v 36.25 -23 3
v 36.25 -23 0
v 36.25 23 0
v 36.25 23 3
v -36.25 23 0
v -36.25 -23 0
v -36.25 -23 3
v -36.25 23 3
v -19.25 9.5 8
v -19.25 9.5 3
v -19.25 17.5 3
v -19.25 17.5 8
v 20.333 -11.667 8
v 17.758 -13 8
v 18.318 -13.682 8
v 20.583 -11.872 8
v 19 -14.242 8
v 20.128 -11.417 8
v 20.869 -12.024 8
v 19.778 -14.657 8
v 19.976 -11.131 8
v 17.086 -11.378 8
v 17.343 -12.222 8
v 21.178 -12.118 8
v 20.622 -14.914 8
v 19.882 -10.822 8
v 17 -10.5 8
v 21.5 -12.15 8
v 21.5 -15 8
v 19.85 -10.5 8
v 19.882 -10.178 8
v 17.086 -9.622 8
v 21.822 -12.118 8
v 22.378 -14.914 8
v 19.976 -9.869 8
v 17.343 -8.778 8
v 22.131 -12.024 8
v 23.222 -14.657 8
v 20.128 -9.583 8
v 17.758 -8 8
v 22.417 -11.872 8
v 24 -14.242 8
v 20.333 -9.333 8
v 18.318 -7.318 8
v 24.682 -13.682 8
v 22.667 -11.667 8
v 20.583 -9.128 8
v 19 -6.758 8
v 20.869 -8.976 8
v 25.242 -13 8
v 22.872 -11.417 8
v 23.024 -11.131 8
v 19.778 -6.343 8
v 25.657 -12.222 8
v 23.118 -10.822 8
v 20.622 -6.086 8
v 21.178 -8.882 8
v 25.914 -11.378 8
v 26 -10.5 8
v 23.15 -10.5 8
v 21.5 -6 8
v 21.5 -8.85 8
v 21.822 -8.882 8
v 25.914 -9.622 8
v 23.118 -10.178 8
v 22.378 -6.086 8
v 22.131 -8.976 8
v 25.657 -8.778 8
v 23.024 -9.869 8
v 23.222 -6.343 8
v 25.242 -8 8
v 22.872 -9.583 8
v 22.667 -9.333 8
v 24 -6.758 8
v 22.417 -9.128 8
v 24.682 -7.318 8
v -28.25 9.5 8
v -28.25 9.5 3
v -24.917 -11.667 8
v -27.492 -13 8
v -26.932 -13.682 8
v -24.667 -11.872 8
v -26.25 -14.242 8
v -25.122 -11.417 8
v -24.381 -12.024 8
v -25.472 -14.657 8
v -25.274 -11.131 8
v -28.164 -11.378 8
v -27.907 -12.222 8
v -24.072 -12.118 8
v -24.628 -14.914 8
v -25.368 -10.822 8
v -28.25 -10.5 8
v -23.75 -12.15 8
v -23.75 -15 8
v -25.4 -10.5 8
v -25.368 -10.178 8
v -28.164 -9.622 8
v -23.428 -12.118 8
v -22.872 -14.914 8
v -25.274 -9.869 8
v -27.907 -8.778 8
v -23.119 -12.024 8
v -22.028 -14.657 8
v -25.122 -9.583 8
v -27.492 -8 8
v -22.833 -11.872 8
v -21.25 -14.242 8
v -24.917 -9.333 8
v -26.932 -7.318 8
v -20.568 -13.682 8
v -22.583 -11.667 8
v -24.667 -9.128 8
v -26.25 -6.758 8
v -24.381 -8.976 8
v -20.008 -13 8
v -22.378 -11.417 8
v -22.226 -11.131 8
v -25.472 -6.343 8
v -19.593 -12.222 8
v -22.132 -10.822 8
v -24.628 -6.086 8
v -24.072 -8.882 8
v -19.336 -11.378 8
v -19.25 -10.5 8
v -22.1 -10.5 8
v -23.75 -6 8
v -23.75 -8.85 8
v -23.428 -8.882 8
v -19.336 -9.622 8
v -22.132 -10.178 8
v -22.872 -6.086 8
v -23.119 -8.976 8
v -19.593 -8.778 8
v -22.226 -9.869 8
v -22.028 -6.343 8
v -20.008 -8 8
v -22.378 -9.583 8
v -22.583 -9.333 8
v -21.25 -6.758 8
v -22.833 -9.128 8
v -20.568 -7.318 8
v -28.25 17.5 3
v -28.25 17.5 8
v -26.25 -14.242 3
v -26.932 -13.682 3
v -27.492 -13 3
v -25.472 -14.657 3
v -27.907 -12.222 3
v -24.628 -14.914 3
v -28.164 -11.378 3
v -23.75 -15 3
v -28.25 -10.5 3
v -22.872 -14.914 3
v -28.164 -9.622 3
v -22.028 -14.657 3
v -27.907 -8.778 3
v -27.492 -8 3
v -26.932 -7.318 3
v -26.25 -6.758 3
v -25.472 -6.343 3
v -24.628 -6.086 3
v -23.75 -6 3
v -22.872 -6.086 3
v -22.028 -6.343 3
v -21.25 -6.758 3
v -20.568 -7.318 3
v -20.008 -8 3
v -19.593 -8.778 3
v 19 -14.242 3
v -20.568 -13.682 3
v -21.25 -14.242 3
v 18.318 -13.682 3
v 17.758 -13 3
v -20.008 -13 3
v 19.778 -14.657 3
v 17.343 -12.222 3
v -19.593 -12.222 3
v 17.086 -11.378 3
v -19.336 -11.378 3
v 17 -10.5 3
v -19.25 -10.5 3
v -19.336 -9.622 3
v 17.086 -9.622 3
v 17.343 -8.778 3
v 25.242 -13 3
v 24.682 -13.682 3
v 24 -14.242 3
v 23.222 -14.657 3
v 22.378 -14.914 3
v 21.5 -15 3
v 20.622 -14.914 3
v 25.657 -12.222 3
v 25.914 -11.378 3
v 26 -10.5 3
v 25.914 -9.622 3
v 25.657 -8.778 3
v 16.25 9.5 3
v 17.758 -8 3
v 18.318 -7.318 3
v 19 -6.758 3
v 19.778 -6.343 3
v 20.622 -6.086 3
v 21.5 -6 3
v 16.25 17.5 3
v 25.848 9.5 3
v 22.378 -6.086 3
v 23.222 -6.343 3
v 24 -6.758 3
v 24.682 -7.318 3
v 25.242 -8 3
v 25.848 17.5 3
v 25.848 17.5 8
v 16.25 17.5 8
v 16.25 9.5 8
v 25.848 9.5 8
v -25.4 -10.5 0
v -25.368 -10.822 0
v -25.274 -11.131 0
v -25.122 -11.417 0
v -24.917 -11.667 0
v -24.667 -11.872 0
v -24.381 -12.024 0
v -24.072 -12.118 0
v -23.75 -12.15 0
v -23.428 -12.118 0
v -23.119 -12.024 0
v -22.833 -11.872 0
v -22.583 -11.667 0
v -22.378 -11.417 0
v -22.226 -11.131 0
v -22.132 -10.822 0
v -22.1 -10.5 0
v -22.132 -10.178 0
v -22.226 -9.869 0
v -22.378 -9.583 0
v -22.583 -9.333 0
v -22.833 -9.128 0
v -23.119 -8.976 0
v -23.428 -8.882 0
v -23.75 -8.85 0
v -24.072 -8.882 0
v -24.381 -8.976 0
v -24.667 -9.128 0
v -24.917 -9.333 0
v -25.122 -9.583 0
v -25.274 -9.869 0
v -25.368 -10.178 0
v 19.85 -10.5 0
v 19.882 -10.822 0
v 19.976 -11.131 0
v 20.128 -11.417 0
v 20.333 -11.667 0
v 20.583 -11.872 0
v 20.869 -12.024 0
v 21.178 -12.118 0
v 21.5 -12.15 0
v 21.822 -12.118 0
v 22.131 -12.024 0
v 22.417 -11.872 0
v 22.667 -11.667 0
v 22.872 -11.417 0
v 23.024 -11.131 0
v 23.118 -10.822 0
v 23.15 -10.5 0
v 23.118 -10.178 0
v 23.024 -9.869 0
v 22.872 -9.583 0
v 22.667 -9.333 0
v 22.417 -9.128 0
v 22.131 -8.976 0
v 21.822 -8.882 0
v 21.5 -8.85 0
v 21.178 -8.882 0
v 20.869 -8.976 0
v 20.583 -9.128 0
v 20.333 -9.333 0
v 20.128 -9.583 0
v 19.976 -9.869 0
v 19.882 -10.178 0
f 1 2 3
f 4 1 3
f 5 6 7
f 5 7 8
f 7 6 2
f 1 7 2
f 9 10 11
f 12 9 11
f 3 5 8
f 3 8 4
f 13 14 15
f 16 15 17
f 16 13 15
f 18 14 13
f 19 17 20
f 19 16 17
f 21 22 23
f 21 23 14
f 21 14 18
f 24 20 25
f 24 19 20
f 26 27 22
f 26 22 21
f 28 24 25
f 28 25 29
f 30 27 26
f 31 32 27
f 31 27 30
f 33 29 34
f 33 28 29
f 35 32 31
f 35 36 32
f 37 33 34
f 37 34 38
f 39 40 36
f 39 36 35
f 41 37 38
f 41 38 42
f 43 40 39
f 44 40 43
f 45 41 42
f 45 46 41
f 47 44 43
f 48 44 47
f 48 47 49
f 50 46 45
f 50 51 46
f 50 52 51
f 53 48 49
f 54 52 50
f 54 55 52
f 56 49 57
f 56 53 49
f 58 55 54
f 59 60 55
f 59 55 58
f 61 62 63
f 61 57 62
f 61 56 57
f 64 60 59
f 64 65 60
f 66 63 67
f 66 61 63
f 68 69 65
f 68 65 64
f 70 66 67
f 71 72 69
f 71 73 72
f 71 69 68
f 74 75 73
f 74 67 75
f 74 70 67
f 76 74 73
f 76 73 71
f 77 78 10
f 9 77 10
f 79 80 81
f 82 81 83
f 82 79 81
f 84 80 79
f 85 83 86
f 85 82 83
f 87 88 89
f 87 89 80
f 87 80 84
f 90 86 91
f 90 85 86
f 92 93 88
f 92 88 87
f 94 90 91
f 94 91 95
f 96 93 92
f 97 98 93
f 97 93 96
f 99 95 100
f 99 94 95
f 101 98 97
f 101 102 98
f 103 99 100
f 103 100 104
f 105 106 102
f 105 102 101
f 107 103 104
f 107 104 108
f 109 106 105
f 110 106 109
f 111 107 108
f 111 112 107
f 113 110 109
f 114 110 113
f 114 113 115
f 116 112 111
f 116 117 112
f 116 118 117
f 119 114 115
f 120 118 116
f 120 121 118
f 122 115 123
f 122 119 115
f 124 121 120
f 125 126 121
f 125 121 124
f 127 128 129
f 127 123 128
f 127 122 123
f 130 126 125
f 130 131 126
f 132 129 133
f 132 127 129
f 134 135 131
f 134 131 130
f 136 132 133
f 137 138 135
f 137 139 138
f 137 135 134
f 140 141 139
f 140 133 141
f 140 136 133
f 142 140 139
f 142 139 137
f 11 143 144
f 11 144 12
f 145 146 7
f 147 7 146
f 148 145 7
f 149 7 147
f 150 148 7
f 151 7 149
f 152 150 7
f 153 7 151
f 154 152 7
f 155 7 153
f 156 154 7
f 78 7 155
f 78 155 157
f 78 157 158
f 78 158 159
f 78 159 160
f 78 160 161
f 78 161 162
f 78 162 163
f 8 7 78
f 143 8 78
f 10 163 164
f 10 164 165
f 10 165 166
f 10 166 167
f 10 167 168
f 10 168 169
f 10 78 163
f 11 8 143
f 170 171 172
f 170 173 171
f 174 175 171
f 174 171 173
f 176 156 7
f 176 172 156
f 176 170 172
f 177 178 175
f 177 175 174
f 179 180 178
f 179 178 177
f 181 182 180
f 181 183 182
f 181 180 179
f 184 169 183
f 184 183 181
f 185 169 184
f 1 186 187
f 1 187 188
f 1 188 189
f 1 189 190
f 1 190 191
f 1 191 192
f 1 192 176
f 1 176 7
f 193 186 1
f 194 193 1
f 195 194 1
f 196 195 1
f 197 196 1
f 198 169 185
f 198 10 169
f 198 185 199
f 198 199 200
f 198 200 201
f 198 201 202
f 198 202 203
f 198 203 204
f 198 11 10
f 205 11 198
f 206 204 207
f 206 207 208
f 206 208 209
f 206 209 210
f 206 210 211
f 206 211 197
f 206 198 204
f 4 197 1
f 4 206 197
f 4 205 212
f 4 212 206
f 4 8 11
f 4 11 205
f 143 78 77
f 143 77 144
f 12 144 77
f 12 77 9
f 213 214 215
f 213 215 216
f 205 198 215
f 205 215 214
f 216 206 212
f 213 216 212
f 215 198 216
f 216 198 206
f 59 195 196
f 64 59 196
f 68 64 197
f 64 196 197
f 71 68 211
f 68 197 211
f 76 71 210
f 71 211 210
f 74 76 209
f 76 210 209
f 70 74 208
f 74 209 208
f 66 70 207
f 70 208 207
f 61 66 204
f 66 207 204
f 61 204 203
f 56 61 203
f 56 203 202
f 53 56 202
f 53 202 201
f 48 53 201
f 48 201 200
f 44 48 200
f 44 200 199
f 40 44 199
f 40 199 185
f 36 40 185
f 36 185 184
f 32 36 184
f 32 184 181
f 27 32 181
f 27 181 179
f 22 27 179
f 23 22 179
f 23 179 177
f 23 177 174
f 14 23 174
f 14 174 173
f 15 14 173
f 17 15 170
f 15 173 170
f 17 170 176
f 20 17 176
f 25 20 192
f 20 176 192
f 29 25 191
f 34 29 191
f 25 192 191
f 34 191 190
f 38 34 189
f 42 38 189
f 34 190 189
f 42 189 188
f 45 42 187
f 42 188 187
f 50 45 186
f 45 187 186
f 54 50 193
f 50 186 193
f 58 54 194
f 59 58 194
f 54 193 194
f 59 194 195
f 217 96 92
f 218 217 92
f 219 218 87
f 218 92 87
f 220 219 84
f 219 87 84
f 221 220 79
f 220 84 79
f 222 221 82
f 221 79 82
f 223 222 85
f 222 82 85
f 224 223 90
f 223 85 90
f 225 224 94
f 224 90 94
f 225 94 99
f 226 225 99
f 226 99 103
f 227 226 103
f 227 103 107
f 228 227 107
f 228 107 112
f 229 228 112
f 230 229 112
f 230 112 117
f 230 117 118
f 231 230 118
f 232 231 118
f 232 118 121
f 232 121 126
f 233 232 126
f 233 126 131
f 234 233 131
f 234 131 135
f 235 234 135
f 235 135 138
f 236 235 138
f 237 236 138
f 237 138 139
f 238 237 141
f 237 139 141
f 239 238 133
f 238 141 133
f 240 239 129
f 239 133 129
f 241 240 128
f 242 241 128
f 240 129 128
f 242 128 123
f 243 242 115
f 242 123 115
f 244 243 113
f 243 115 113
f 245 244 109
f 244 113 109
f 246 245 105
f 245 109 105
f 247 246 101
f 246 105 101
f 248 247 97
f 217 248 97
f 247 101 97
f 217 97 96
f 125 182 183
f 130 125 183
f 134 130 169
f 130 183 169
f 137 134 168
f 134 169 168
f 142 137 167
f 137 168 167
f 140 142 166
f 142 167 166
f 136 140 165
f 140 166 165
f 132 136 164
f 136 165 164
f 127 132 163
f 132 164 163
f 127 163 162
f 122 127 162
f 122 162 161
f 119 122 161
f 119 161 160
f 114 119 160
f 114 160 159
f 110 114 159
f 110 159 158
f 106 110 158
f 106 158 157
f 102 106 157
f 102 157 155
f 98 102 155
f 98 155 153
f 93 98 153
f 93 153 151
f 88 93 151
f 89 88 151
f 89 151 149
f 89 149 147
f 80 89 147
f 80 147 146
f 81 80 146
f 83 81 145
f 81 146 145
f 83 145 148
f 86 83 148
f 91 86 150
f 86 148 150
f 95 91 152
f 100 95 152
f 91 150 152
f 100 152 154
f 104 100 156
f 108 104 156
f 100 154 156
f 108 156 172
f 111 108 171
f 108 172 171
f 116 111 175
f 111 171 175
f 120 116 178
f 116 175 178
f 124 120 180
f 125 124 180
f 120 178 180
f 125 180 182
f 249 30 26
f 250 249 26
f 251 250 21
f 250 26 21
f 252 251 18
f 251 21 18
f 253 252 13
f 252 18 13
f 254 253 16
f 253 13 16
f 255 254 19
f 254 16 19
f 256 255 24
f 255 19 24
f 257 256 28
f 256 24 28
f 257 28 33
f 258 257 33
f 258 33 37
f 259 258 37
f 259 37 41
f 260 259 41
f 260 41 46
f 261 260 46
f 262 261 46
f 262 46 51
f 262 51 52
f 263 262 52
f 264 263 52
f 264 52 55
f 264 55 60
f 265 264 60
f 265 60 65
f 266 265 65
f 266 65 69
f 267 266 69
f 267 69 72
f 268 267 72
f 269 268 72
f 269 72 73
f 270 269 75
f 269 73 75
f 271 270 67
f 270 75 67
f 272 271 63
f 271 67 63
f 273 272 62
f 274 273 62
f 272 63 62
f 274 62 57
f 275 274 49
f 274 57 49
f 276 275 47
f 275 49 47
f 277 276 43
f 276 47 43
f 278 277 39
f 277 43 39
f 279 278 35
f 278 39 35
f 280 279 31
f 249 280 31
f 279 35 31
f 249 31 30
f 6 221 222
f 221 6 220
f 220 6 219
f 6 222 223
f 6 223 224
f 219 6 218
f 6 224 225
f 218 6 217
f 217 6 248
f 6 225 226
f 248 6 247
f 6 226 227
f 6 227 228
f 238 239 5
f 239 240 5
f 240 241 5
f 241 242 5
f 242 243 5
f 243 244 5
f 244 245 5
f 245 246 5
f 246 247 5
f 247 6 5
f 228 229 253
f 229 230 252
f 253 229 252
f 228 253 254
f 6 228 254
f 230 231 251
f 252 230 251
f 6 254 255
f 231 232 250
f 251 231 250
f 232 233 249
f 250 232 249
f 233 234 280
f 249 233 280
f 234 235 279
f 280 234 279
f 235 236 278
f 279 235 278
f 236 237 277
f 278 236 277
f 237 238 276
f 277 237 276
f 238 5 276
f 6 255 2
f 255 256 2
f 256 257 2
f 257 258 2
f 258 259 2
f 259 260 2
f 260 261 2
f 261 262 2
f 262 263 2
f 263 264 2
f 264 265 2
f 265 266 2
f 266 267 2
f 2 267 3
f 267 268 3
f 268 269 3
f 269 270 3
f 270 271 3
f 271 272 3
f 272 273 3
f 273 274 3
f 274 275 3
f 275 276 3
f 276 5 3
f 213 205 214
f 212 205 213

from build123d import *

# Parameters (mm, degrees)
F0_W     = 72.5
F0_H     = 46
F0_R     = 4.5
F1_DEPTH = 3
F2_DEPTH = 8
F3_D     = 3.3
F4_W     = 9
F4_H     = 8
F5_DEPTH = 5
F6_W     = 9.5978157372
F6_H     = 8
F7_DEPTH = 5


with BuildPart() as f1:
    # F0 (on Top) → F1 (new body)
    with BuildSketch(Plane.XY):
        Rectangle(F0_W, F0_H)
        with Locations((-23.75, -10.5)):
            Circle(F0_R, mode=Mode.SUBTRACT)
        with Locations((21.5, -10.5)):
            Circle(F0_R, mode=Mode.SUBTRACT)
        with Locations((-23.75, -10.5)):
            Circle(F0_R)
        with Locations((21.5, -10.5)):
            Circle(F0_R)
    extrude(amount=F1_DEPTH)

    # F0 (on Top) → F2 (join)
    with BuildSketch(Plane.XY):
        with Locations((-23.75, -10.5)):
            Circle(F0_R)
        with Locations((21.5, -10.5)):
            Circle(F0_R)
    extrude(amount=F2_DEPTH)

    # F3 (through all)
    with Locations(Plane(origin=(0, 0, 0), x_dir=(1, 0, 0), z_dir=(0, 0, -1))):
        with Locations((21.5, 10.5), (-23.75, 10.5)):
            Hole(F3_D / 2)

    # F4 (on face) → F5 (join)
    with BuildSketch(Plane.XY.offset(3)):
        with Locations((-23.75, 13.5)):
            Rectangle(F4_W, F4_H)
    extrude(amount=F5_DEPTH)

    # F6 (on face) → F7 (join)
    with BuildSketch(Plane.XY.offset(3)):
        with Locations((21.0489078686, 13.5)):
            Rectangle(F6_W, F6_H)
    extrude(amount=F7_DEPTH)


solid = f1.part
